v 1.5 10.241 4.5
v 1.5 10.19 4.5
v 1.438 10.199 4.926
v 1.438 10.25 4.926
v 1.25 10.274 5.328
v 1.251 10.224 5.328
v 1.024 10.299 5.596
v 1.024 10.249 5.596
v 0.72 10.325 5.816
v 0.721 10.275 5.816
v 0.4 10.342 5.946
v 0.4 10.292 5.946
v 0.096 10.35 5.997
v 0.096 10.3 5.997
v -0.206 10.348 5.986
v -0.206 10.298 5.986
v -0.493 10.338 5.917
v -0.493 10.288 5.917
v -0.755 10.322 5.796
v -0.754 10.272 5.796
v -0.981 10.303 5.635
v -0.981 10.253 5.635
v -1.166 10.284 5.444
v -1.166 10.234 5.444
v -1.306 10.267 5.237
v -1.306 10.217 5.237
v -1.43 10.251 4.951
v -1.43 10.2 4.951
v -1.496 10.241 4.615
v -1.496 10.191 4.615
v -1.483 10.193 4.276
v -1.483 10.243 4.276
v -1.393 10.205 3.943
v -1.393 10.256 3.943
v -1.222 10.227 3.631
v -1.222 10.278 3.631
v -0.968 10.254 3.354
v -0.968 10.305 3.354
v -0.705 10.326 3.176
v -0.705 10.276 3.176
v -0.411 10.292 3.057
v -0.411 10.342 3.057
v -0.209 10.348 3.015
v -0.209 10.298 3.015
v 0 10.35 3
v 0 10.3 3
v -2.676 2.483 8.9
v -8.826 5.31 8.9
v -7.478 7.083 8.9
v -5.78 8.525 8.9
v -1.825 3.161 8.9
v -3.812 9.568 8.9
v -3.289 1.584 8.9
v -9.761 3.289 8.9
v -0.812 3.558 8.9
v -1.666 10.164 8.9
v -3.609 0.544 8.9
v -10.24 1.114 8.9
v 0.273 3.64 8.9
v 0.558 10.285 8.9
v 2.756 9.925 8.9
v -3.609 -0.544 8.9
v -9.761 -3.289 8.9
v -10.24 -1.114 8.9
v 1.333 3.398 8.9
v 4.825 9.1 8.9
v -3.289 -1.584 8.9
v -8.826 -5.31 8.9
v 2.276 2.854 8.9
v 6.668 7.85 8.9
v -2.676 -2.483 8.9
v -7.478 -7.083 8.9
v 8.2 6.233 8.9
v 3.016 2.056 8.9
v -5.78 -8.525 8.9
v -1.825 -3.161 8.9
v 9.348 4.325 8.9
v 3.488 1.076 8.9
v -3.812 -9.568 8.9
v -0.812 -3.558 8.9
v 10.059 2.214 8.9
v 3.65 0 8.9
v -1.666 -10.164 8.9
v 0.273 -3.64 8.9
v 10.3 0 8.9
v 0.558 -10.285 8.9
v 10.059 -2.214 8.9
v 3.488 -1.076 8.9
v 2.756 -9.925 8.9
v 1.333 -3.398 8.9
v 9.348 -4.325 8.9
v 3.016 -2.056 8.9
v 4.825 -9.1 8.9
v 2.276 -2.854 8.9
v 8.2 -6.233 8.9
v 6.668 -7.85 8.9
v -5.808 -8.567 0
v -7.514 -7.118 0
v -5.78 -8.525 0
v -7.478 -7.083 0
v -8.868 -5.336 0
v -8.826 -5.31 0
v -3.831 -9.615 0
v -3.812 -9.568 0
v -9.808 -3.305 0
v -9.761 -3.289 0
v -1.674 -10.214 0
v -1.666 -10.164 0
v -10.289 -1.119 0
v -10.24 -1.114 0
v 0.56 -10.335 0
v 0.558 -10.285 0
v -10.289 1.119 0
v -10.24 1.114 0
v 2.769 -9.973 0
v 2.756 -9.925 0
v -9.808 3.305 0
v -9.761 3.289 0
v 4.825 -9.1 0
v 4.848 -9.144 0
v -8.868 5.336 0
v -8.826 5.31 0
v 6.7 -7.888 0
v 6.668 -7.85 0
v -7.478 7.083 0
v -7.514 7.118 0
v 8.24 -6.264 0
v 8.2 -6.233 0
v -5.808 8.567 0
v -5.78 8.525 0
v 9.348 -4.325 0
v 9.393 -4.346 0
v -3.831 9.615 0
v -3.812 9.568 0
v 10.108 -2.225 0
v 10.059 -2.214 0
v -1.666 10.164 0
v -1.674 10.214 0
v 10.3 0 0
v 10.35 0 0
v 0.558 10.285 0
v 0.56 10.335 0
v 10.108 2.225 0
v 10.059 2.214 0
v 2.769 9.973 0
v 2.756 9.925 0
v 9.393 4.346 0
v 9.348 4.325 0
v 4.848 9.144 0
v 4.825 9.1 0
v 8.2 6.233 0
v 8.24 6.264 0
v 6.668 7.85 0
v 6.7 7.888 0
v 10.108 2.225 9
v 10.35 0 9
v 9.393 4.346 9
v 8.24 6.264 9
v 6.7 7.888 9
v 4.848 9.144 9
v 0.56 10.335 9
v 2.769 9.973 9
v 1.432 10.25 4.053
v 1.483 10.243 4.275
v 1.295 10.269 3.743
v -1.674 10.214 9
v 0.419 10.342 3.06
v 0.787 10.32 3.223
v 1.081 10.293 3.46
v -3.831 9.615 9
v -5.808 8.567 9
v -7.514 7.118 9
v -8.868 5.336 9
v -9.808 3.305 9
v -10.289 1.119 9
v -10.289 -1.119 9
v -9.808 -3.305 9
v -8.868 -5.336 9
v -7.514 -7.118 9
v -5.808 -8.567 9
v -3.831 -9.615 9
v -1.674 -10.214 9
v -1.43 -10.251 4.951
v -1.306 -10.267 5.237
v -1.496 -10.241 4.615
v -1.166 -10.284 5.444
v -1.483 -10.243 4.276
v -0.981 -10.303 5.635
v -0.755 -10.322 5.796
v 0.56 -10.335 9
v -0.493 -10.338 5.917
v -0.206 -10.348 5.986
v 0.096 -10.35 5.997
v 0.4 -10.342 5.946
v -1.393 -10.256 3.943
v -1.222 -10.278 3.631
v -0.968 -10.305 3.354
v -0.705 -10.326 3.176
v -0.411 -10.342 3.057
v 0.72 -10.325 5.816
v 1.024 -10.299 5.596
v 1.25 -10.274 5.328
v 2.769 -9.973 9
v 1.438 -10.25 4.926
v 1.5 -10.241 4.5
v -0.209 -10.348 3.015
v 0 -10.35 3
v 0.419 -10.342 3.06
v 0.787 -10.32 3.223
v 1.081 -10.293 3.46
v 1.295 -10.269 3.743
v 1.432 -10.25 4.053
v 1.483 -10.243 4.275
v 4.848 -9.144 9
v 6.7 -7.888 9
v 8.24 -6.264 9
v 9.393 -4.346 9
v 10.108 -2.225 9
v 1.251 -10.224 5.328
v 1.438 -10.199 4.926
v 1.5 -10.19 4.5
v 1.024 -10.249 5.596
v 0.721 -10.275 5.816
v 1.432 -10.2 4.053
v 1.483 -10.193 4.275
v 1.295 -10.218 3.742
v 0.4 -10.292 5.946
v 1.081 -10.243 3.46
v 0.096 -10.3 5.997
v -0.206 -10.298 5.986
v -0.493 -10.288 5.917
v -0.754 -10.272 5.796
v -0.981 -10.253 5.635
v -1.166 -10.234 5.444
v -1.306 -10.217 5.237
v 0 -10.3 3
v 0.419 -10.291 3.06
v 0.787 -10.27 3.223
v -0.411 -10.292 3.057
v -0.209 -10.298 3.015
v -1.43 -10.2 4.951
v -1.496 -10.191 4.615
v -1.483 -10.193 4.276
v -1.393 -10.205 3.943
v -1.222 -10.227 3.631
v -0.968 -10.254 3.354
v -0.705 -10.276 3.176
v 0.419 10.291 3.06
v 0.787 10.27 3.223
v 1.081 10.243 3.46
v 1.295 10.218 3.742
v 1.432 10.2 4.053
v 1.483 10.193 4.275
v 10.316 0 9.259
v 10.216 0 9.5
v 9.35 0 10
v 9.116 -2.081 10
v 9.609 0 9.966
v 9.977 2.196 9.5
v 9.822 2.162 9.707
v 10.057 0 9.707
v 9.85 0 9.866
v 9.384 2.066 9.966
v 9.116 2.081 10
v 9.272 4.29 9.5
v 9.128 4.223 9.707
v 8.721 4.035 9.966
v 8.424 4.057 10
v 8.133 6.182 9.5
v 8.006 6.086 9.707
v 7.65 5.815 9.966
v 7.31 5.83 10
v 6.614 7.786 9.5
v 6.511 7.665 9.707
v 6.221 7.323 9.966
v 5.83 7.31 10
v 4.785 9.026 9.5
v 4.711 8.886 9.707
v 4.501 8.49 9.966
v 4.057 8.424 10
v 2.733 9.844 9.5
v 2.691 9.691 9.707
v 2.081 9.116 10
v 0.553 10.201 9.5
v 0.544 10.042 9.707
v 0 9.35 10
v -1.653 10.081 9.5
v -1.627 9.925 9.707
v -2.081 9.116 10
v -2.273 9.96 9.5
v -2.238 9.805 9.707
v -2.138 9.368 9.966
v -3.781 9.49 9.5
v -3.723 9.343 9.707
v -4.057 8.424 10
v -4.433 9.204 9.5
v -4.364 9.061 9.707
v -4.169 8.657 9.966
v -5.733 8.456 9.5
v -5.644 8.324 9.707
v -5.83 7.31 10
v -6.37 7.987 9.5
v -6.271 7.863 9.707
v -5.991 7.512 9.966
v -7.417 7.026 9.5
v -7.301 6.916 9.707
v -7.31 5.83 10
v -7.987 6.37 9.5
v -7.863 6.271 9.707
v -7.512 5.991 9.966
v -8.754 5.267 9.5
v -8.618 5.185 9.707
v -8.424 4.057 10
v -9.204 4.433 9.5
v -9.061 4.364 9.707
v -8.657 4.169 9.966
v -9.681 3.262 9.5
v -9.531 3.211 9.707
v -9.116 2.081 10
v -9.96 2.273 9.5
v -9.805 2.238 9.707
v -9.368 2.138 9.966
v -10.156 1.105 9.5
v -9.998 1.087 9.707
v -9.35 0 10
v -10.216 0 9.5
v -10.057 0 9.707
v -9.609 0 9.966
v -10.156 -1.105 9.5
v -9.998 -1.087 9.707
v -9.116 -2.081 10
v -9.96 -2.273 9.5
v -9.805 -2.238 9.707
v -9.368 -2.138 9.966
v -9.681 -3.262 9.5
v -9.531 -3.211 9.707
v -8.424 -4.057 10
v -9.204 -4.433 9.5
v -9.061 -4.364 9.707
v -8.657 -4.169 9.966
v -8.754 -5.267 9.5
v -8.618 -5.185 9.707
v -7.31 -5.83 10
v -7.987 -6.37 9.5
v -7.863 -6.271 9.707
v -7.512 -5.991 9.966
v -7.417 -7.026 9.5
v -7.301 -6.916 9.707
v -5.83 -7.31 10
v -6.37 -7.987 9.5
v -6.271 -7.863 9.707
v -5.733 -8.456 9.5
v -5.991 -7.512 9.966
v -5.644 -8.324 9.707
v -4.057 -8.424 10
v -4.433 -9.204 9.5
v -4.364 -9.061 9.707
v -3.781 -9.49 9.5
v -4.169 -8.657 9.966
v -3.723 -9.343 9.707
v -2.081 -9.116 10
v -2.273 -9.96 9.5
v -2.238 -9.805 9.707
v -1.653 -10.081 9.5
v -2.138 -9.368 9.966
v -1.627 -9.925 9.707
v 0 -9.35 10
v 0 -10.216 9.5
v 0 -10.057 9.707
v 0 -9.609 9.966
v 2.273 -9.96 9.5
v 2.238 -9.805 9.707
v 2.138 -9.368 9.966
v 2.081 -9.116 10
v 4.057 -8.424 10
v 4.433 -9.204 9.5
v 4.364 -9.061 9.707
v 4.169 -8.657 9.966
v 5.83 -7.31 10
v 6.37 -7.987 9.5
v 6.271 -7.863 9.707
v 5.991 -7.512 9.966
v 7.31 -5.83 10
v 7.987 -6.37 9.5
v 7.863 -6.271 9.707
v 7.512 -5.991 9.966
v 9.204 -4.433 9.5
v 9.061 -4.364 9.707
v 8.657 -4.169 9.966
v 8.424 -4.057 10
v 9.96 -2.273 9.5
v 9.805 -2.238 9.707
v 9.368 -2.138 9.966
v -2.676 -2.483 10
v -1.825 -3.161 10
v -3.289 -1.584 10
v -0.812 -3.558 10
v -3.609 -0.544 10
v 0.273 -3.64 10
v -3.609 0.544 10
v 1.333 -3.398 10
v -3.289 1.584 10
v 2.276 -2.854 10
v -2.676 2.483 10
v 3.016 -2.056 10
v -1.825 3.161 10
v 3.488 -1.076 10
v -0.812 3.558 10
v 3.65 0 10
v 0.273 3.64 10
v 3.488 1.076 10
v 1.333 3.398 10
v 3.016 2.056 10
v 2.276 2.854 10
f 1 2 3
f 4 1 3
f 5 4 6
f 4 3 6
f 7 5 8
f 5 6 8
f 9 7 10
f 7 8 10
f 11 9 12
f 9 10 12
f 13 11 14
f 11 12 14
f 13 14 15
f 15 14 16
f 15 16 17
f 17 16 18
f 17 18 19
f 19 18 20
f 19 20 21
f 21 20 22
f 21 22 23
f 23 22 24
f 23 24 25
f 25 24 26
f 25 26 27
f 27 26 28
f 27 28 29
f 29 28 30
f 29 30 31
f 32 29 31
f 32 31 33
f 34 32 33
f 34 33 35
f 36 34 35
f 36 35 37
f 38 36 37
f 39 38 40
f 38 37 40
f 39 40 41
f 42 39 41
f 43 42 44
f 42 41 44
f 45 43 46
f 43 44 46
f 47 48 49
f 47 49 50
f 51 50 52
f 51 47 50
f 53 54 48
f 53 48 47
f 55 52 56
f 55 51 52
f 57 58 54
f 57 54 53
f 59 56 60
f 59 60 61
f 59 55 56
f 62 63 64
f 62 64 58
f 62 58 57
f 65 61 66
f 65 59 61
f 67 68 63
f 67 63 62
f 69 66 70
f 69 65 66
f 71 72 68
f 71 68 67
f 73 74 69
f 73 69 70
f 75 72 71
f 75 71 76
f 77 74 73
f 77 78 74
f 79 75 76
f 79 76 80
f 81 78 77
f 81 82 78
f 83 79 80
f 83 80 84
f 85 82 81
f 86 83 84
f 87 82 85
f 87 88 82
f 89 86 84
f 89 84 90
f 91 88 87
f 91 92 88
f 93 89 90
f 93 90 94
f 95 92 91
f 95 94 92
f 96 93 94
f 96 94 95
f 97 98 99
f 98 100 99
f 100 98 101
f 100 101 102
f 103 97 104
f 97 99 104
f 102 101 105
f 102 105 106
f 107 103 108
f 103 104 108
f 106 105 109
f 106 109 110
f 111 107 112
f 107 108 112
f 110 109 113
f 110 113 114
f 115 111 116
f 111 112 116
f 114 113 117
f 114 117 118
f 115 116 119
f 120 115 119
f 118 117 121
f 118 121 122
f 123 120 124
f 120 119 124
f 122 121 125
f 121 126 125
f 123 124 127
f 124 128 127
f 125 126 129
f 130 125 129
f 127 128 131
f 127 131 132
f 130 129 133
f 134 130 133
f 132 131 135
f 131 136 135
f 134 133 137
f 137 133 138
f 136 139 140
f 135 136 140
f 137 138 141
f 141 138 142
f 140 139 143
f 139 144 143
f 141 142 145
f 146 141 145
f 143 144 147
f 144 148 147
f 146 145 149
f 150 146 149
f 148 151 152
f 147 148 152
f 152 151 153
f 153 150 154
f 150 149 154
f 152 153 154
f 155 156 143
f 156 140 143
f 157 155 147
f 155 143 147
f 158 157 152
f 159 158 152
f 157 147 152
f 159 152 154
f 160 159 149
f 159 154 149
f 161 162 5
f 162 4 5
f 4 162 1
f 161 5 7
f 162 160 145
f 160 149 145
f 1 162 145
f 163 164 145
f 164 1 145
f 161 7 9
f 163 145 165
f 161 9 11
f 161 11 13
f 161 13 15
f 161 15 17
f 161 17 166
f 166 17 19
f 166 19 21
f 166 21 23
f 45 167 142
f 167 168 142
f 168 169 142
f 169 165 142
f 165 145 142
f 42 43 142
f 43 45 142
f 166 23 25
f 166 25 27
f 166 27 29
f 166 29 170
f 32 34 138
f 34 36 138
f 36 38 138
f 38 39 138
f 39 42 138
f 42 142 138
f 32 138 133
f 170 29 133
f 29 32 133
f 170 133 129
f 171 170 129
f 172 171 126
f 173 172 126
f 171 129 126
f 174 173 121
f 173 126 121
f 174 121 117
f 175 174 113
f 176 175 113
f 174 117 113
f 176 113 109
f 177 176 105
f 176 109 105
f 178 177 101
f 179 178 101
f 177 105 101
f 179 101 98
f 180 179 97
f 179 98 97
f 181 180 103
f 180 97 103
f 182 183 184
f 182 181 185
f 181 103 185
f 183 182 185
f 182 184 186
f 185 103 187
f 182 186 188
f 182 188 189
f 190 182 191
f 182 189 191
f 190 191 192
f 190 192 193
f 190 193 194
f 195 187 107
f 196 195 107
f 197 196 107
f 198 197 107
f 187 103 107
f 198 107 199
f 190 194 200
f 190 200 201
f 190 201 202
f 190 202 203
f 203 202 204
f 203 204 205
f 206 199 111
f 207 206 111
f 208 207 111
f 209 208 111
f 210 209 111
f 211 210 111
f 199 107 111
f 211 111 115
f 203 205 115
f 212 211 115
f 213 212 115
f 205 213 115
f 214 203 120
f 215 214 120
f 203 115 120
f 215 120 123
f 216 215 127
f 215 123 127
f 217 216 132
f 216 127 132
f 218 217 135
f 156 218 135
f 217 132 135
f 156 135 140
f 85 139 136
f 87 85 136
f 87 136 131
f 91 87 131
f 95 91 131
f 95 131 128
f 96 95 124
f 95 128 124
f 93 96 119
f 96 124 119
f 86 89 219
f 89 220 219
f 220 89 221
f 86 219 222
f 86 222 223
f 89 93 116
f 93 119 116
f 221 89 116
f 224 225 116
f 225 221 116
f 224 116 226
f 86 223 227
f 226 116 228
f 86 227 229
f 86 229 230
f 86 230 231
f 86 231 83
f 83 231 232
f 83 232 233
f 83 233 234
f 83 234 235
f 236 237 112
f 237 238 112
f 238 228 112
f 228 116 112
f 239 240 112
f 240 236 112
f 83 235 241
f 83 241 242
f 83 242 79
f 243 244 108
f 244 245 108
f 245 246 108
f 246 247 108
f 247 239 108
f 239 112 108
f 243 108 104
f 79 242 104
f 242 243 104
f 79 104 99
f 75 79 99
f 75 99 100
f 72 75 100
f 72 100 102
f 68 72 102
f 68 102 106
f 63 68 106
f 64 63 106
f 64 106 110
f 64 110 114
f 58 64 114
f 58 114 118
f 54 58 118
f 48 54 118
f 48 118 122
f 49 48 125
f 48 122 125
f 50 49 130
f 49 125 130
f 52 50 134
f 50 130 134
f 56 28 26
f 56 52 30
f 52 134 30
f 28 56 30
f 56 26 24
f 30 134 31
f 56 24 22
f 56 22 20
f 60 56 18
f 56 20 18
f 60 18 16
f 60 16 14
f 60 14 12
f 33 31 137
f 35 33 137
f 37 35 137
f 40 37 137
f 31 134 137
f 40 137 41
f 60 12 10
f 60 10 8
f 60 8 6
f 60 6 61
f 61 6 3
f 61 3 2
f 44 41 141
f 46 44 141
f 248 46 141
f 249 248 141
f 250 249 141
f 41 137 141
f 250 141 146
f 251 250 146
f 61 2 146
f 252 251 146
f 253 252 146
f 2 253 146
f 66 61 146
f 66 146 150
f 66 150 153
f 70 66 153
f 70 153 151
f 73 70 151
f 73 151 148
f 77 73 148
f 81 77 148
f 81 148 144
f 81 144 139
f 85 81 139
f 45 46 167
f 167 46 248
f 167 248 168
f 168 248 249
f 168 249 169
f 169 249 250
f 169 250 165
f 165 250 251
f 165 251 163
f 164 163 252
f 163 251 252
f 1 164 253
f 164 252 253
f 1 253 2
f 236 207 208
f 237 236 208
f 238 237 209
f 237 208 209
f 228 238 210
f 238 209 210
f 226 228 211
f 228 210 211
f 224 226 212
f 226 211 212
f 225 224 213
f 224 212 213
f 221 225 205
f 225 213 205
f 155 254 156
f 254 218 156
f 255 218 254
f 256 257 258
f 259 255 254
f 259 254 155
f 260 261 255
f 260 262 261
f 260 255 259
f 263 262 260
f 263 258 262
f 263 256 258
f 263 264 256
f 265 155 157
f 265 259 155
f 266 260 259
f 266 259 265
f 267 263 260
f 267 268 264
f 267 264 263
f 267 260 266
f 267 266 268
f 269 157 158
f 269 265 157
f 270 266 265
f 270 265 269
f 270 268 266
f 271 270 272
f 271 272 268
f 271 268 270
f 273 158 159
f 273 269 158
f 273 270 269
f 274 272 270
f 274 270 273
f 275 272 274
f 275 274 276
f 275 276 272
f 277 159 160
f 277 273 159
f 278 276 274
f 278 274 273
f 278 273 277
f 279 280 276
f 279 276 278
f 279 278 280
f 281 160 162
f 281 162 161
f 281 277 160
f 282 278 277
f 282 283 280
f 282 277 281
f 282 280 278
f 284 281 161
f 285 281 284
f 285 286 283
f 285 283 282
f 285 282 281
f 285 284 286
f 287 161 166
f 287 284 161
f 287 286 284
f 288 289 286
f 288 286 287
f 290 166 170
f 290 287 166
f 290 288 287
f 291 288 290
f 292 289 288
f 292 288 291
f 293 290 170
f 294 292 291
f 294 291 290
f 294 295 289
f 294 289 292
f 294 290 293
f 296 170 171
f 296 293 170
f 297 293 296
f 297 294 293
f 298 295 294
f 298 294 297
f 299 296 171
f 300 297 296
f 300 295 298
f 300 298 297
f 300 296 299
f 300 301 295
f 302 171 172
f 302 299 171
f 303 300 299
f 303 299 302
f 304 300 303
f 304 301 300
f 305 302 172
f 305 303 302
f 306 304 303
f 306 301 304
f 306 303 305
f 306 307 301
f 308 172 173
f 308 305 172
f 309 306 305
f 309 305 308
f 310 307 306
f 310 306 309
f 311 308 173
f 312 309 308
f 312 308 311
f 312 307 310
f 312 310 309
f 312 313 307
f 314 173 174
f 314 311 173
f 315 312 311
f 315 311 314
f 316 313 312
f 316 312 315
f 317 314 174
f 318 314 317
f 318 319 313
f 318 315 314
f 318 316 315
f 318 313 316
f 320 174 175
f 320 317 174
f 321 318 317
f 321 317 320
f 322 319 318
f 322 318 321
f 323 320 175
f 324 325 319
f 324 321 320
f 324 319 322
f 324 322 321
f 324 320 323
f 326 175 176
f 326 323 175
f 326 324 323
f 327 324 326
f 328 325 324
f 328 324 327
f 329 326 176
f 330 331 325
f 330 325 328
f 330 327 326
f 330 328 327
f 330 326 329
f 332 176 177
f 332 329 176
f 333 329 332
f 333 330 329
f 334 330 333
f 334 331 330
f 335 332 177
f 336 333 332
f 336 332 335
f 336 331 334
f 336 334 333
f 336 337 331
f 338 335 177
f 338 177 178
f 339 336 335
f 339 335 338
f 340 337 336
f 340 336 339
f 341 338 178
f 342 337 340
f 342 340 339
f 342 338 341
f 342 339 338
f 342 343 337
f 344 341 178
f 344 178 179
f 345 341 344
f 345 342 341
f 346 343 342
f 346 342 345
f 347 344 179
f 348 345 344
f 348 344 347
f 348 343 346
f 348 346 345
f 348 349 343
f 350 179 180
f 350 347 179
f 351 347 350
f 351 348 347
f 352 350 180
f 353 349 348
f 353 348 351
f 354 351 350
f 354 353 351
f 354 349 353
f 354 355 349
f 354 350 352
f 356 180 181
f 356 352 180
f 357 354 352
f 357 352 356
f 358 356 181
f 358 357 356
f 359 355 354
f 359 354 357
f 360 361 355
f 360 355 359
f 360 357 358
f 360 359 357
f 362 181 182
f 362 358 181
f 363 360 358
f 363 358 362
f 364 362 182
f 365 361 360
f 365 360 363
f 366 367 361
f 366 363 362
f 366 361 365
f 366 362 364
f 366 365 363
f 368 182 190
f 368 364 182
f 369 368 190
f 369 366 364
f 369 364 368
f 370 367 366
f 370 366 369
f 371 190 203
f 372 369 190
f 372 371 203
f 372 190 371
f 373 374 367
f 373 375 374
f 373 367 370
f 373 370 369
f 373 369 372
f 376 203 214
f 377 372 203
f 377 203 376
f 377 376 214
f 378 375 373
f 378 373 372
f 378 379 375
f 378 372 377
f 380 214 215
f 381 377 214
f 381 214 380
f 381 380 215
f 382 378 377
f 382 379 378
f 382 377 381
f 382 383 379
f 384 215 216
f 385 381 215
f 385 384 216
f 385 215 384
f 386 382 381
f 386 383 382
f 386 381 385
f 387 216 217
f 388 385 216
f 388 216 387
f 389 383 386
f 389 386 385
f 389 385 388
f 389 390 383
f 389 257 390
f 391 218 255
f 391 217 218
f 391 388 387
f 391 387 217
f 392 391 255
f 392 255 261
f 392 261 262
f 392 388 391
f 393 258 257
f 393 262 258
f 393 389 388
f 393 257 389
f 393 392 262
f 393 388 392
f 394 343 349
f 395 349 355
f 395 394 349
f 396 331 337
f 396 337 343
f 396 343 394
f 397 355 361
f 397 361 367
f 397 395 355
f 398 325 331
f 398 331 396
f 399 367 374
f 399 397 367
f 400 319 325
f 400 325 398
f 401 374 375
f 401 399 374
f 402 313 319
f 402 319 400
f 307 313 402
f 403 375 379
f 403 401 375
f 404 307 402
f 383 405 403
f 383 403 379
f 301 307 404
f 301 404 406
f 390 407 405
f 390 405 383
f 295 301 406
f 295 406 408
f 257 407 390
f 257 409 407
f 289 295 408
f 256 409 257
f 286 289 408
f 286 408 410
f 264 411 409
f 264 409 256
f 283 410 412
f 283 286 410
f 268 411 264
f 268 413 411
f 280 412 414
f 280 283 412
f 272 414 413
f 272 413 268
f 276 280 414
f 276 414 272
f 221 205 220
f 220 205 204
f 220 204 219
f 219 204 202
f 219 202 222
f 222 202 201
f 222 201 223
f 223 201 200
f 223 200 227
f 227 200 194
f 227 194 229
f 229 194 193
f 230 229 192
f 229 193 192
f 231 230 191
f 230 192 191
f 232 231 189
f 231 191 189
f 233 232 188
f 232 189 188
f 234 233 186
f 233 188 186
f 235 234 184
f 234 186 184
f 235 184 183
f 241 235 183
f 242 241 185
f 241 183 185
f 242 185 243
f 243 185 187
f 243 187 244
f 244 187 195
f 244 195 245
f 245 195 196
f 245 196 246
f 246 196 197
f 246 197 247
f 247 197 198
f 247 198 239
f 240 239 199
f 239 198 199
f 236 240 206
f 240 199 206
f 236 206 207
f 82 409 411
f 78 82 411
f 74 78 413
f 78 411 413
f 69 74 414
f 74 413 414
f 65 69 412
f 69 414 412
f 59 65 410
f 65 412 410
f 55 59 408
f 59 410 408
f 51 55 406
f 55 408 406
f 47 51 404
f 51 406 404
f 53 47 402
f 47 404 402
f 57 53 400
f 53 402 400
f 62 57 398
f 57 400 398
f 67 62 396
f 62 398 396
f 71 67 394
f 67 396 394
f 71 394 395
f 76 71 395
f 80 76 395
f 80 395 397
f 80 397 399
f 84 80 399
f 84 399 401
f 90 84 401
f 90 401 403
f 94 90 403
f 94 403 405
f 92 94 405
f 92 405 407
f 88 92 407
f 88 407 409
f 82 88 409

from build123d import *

# Parameters (mm, degrees)
F0_R     = 10.35
F1_DEPTH = 10
F2_R     = 1
F3_R     = 3.65
F4_DEPTH = 25
F5_R     = 10.3
F6_DEPTH = 8.9
F8_DEPTH = 12.5


with BuildPart() as f1:
    # F0 (on Top) → F1 (new body)
    with BuildSketch(Plane.XY):
        Circle(F0_R)
    extrude(amount=F1_DEPTH)

    # F2
    f2_edges = [f1.edges().sort_by_distance(p)[0] for p in [
        (-10.35, 0, 10),
    ]]
    fillet(f2_edges, radius=F2_R)

    # F3 (on face) → F4 (cut)
    with BuildSketch(Plane.XY.offset(10)):
        Circle(F3_R)
    extrude(amount=-F4_DEPTH, mode=Mode.SUBTRACT)

    # F5 (on face) → F6 (cut)
    with BuildSketch(Plane(origin=(0, 0, 0), x_dir=(1, 0, 0), z_dir=(0, 0, -1))):
        Circle(F5_R)
    extrude(amount=-F6_DEPTH, mode=Mode.SUBTRACT)

    # F7 (on Front) → F8 (cut, symmetric)
    with BuildSketch(Plane.XZ):
        with BuildLine():
            ThreePointArc((0, 3), (1.06066, 3.43934), (1.5, 4.5))
            ThreePointArc((1.5, 4.5), (-1.06066, 5.56066), (0, 3))
        make_face()
    extrude(amount=F8_DEPTH, both=True, mode=Mode.SUBTRACT)


solid = f1.part
